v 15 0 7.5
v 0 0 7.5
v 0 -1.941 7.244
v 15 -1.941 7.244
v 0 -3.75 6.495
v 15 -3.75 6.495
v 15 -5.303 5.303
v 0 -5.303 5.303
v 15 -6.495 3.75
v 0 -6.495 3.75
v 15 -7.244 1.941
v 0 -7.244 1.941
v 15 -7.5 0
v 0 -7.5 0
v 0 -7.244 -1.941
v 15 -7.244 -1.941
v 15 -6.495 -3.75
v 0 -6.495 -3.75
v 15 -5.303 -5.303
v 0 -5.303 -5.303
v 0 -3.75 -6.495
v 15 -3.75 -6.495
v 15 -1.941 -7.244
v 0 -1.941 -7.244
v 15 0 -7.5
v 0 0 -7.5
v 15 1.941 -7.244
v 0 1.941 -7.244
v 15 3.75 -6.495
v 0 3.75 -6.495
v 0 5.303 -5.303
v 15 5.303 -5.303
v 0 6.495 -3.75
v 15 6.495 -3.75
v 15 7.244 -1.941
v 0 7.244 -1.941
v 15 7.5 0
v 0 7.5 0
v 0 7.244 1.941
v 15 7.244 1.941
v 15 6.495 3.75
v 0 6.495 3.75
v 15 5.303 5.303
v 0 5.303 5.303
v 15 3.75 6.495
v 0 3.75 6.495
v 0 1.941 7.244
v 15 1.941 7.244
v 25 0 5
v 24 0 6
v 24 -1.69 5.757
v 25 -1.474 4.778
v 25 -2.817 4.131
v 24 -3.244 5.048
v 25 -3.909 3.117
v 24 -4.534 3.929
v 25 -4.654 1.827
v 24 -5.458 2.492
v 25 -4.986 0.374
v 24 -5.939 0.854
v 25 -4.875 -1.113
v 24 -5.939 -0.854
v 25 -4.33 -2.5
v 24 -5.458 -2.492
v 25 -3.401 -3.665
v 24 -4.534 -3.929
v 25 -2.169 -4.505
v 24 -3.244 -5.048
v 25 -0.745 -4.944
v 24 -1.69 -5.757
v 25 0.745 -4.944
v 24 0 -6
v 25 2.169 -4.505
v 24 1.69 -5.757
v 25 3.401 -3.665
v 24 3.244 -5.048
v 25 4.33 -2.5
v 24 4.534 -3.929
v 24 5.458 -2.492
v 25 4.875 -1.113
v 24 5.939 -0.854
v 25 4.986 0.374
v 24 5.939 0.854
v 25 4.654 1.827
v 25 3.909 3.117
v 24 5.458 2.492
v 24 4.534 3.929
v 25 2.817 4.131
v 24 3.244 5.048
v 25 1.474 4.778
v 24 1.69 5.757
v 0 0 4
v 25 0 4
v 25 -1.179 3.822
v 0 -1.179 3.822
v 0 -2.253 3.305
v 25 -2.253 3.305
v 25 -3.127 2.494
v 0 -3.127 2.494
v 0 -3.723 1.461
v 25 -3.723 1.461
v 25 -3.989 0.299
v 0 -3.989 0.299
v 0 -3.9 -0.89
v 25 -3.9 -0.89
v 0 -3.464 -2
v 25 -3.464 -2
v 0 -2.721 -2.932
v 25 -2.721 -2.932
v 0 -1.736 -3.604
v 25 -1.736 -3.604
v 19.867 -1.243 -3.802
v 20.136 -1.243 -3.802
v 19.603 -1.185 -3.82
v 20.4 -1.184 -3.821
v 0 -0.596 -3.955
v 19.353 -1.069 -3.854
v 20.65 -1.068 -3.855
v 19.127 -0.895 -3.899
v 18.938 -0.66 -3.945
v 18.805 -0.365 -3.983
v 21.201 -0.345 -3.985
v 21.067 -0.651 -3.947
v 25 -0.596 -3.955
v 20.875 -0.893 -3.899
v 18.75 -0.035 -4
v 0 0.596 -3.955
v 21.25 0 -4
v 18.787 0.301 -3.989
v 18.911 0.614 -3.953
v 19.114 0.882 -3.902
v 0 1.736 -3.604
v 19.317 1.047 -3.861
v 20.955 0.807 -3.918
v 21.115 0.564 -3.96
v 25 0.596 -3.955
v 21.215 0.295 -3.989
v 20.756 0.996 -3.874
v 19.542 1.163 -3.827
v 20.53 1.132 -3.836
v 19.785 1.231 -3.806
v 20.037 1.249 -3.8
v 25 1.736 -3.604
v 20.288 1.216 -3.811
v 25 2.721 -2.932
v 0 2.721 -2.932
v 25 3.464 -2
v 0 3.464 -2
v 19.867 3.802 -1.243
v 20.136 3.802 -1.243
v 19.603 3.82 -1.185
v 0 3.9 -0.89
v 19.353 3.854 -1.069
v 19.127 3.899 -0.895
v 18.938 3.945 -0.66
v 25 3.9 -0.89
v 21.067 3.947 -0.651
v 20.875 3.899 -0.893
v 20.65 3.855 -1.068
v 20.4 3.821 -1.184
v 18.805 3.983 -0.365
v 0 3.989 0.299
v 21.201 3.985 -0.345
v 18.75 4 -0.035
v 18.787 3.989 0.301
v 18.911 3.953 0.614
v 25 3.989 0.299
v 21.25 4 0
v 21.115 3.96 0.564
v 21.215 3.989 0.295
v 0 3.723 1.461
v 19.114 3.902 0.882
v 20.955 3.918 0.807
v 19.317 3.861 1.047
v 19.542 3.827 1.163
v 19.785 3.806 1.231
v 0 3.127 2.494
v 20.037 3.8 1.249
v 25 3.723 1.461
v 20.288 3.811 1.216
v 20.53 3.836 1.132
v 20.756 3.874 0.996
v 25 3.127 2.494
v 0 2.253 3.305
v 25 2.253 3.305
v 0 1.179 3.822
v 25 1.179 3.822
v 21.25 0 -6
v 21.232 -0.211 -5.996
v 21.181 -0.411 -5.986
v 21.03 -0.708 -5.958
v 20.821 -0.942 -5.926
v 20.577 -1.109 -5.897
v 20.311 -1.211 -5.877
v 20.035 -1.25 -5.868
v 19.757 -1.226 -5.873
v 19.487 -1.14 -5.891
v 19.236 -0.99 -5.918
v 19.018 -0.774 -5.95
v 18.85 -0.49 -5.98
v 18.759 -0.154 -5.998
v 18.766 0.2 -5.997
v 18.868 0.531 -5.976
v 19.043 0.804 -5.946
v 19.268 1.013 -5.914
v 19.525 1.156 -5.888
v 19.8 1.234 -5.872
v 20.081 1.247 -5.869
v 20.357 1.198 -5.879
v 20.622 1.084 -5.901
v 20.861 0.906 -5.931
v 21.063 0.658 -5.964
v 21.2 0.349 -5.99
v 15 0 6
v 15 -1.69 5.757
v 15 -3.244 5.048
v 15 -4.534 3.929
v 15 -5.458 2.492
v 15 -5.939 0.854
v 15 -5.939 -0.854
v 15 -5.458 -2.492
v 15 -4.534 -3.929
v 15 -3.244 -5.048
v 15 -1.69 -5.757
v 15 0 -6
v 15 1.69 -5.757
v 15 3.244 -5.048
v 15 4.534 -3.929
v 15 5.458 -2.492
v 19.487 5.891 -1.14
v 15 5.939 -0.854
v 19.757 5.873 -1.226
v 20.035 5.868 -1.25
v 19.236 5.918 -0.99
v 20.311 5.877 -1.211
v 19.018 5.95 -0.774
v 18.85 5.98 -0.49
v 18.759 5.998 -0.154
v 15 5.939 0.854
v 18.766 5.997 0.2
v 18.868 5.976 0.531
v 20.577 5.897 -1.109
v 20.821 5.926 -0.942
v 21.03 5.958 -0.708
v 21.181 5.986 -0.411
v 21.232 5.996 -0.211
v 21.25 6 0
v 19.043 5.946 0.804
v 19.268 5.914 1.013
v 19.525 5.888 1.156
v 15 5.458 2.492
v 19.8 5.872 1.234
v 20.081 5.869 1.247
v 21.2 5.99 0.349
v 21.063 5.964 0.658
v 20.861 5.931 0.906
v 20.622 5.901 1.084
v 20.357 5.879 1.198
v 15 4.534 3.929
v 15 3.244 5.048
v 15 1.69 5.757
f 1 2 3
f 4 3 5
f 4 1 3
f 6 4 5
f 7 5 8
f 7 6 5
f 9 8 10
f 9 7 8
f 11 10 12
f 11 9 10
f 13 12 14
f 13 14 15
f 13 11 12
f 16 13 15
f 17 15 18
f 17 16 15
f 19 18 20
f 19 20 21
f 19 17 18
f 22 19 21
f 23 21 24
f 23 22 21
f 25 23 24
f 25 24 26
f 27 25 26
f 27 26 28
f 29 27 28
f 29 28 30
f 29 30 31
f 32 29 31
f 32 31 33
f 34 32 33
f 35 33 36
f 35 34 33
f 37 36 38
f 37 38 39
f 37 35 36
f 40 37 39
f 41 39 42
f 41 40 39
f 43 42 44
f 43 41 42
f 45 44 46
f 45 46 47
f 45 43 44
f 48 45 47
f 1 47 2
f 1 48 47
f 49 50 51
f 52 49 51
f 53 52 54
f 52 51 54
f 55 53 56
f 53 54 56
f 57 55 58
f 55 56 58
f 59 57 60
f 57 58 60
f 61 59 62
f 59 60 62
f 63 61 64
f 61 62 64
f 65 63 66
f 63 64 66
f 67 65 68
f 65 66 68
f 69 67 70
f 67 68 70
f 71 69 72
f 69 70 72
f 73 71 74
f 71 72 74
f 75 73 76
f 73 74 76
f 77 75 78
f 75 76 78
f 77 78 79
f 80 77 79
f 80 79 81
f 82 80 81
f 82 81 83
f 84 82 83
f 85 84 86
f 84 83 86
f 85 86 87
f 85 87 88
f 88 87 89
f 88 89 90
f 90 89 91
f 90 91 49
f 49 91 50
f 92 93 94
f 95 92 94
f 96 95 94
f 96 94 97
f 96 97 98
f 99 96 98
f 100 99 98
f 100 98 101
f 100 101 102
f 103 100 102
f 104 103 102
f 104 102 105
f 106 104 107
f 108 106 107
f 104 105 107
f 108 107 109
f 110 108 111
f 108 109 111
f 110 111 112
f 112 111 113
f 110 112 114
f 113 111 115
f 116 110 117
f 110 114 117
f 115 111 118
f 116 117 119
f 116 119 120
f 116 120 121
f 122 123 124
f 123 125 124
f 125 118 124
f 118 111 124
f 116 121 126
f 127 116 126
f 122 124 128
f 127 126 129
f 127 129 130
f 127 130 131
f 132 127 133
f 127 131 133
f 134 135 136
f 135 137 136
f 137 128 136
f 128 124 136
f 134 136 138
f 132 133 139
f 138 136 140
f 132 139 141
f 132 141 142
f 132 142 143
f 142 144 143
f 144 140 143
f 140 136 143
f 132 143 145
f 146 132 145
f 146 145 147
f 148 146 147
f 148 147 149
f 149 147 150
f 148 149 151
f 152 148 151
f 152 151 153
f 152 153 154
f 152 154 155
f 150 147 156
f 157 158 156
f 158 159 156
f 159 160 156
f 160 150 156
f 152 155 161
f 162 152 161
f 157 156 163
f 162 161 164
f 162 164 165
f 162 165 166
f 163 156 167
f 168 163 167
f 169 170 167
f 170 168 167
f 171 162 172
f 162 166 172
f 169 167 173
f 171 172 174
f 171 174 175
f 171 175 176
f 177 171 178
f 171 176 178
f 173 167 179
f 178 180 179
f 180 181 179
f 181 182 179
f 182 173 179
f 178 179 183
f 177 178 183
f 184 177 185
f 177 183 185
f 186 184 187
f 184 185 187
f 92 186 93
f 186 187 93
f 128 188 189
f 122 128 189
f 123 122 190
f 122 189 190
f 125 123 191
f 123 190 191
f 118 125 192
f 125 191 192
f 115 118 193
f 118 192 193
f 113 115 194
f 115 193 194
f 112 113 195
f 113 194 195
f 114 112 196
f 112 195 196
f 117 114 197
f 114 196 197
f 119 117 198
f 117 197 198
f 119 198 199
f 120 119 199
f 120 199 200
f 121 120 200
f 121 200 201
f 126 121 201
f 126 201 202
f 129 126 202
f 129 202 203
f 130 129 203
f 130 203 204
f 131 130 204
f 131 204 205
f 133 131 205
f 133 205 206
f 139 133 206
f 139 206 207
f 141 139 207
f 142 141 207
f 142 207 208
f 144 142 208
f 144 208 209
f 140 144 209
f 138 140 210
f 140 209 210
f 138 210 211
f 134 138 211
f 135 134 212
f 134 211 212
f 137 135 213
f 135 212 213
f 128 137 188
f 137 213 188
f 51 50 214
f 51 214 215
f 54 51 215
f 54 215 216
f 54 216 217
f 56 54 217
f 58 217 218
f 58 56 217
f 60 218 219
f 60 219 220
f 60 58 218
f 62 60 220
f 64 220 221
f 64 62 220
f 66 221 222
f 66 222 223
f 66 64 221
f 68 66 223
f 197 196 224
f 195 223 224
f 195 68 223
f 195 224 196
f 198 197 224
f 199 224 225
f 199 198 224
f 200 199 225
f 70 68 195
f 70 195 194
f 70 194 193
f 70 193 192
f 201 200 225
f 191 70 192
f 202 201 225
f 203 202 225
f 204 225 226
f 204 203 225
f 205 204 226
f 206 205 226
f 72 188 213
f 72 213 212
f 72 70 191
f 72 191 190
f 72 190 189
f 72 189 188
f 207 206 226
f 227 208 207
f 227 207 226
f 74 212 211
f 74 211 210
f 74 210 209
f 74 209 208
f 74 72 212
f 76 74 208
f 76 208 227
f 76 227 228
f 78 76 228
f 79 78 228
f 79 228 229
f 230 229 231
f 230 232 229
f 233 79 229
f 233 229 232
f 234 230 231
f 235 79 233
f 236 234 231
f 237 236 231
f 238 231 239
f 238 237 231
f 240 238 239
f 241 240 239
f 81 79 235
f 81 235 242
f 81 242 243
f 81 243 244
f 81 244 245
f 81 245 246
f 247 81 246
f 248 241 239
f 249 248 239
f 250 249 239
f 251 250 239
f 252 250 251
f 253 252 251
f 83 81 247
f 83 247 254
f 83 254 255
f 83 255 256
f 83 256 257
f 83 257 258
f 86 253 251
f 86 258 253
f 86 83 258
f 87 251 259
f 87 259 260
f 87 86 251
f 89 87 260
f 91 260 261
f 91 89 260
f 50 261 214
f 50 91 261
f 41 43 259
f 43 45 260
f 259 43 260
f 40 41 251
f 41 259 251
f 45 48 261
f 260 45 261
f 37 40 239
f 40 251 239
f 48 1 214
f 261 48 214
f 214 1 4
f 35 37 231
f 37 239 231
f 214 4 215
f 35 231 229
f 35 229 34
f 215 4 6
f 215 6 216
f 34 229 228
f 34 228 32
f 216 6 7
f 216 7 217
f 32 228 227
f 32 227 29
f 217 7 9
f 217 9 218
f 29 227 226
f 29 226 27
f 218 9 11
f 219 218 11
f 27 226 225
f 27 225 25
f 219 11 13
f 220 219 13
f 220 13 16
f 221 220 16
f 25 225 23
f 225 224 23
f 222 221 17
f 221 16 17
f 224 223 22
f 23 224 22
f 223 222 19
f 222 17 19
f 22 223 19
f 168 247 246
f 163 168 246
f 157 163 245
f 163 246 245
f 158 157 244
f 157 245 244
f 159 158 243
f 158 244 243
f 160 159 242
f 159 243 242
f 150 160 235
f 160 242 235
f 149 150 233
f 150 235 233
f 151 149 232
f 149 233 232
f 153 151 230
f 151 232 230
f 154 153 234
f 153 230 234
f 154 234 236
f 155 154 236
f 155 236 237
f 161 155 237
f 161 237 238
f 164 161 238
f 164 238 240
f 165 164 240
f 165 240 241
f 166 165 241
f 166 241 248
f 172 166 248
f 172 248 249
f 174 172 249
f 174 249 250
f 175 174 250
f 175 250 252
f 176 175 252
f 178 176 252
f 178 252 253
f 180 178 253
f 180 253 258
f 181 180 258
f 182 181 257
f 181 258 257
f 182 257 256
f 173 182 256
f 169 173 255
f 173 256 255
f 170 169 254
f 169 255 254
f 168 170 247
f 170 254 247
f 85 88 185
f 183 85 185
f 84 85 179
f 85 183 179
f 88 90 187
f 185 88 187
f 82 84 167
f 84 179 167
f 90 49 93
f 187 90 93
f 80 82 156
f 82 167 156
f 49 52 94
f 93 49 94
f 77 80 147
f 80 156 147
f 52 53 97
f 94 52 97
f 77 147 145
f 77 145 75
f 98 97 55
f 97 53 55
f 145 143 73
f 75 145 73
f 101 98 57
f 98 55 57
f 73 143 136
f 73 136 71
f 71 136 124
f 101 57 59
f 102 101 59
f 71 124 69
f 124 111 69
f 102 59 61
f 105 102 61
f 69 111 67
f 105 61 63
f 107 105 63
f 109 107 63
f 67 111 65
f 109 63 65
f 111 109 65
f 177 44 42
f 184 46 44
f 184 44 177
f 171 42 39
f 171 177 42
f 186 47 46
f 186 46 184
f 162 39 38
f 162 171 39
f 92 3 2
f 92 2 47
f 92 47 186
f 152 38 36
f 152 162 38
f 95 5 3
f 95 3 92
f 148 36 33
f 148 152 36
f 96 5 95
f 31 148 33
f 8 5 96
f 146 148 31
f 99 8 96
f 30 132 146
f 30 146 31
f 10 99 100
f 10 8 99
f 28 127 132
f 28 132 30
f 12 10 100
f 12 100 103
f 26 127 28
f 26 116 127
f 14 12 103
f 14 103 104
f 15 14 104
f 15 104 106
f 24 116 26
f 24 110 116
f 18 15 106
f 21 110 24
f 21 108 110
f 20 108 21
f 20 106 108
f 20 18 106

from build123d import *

# Parameters (mm, degrees)
SKETCH1_W           = 25
SKETCH1_H           = 2
SKETCH2_W           = 15
SKETCH2_H           = 3.5
TAPPED_HOLE1_REACH  = 31.385
TAPPED_HOLE1_BORE_R = 1.25
CIRPATTERN1_COUNT   = 2
CIRPATTERN1_ANGLE   = 90
CHAMFER1_SIZE       = 1


with BuildPart() as part:
    # Sketch1 → Revolve1 (revolve)
    with BuildSketch(Plane.XY, mode=Mode.PRIVATE) as revolve1_sk:
        with Locations((12.5, 5)):
            Rectangle(SKETCH1_W, SKETCH1_H)
    revolve(revolve1_sk.sketch.rotate(Axis((0, 0, 0), (1, 0, 0)), 90), axis=Axis((0, 0, 0), (1, 0, 0)))

    # Sketch2 → Revolve2 (revolve)
    with BuildSketch(Plane.XY, mode=Mode.PRIVATE) as revolve2_sk:
        with Locations((7.5, 5.75)):
            Rectangle(SKETCH2_W, SKETCH2_H)
    revolve(revolve2_sk.sketch.rotate(Axis((0, 0, 0), (1, 0, 0)), 90), axis=Axis((0, 0, 0), (1, 0, 0)))

    # Tapped Hole1 bore → Tapped Hole1 (cut, up to next)
    with BuildSketch(Plane(origin=(0, 6, 0), x_dir=(1, 0, 0), z_dir=(0, 1, 0)), mode=Mode.PRIVATE) as tapped_hole1_sk1:
        with Locations((20, 0)):
            Circle(TAPPED_HOLE1_BORE_R)
    tapped_hole1_tool1 = extrude(tapped_hole1_sk1.sketch, amount=-TAPPED_HOLE1_REACH, mode=Mode.PRIVATE) & part.part
    tapped_hole1 = tapped_hole1_tool1.solids().sort_by_distance((20, 6, 0))[0]
    add(tapped_hole1, mode=Mode.SUBTRACT)

    # CirPattern1: Tapped Hole1 ×2 about axis
    cirpattern1_axis = Axis((0, 0, 0), (-1, 0, 0))
    for i in range(1, CIRPATTERN1_COUNT):
        add(tapped_hole1.rotate(cirpattern1_axis, i * CIRPATTERN1_ANGLE / (CIRPATTERN1_COUNT - 1)), mode=Mode.SUBTRACT)

    # Chamfer1
    chamfer1_edges = [part.edges().sort_by_distance(p)[0] for p in [
        (25, 0, -6),
    ]]
    chamfer(chamfer1_edges, length=CHAMFER1_SIZE)


solid = part.part
